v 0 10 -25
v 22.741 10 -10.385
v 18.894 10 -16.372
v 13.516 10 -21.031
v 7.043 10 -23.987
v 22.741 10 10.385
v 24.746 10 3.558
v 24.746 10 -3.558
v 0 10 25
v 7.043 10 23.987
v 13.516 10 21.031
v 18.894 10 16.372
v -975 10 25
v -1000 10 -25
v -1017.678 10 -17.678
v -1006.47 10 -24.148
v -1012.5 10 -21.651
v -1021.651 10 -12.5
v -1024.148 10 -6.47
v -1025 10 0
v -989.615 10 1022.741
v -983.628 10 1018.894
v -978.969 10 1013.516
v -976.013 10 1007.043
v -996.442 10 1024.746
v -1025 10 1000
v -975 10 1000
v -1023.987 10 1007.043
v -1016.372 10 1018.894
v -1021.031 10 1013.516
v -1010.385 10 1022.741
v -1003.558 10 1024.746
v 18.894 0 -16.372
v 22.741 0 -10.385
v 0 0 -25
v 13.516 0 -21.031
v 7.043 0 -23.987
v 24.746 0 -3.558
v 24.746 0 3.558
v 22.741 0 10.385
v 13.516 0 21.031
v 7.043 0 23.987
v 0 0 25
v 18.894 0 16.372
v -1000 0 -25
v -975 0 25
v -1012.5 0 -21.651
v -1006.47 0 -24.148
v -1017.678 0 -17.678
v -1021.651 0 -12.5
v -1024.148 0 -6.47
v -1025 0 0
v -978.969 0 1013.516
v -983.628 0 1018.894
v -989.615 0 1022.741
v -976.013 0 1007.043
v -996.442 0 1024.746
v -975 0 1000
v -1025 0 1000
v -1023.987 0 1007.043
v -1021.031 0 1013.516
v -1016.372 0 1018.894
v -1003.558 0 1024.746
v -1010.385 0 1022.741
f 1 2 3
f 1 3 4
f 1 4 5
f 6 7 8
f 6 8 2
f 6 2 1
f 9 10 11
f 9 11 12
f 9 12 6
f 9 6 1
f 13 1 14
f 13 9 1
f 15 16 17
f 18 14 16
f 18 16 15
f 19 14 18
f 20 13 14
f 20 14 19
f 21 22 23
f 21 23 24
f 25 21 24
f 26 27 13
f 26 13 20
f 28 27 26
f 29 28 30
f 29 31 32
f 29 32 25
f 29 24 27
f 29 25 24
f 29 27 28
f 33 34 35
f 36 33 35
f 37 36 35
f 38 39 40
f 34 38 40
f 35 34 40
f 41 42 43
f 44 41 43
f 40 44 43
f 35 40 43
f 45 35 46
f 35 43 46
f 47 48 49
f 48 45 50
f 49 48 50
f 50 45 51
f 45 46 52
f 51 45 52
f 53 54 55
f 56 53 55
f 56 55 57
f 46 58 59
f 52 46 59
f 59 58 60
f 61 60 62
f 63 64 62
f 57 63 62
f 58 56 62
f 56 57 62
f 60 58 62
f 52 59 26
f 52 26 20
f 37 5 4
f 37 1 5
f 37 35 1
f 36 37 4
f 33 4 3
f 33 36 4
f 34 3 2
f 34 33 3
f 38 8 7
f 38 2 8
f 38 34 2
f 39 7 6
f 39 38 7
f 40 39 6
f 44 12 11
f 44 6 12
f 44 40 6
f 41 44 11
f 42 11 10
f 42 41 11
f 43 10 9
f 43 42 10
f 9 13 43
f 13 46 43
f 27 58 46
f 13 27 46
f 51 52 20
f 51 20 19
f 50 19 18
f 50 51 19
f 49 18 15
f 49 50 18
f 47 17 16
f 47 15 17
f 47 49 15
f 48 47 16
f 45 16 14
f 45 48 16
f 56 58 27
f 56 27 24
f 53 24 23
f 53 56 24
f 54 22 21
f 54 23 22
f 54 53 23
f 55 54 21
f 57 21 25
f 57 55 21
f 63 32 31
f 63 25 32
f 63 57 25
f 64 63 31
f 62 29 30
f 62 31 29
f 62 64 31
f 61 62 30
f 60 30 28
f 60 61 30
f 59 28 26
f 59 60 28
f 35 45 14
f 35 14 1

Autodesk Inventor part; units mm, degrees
ref_plane "YZ Plane" through (0, 0, 0) normal (1, 0, 0) x (0, 1, 0)
ref_plane "XZ Plane" through (0, 0, 0) normal (0, 1, 0) x (-1, 0, 0)
ref_plane "XY Plane" through (0, 0, 0) normal (0, 0, 1) x (1, 0, 0)
sketch "Boceto1" plane through (0, 0, 0) normal (0, 1, 0) x (-1, 0, 0)
  line L0 (0, 0) -> (1000, 0)
  line L1 (1000, 25) -> (1000, 1000)
  line L2 (975, 1000) -> (975, 25)
  line L3 (975, 25) -> (0, 25)
  line L4 (1025, 1000) -> (1025, 0)
  line L5 (1000, -25) -> (0, -25)
  line L6 (1025, 1000) -> (975, 1000)
  line L7 (0, -25) -> (0, 25)
  circle A0 centre (0, 0) radius 25
  circle A1 centre (1000, 1000) radius 25
  arc A2 (1000, -25) -> (1025, 0) centre (1000, 0) ccw
extrude "Extrusión1" add sketch "Boceto1" along normal blind 10
properties part number "suelo_pruebas"
